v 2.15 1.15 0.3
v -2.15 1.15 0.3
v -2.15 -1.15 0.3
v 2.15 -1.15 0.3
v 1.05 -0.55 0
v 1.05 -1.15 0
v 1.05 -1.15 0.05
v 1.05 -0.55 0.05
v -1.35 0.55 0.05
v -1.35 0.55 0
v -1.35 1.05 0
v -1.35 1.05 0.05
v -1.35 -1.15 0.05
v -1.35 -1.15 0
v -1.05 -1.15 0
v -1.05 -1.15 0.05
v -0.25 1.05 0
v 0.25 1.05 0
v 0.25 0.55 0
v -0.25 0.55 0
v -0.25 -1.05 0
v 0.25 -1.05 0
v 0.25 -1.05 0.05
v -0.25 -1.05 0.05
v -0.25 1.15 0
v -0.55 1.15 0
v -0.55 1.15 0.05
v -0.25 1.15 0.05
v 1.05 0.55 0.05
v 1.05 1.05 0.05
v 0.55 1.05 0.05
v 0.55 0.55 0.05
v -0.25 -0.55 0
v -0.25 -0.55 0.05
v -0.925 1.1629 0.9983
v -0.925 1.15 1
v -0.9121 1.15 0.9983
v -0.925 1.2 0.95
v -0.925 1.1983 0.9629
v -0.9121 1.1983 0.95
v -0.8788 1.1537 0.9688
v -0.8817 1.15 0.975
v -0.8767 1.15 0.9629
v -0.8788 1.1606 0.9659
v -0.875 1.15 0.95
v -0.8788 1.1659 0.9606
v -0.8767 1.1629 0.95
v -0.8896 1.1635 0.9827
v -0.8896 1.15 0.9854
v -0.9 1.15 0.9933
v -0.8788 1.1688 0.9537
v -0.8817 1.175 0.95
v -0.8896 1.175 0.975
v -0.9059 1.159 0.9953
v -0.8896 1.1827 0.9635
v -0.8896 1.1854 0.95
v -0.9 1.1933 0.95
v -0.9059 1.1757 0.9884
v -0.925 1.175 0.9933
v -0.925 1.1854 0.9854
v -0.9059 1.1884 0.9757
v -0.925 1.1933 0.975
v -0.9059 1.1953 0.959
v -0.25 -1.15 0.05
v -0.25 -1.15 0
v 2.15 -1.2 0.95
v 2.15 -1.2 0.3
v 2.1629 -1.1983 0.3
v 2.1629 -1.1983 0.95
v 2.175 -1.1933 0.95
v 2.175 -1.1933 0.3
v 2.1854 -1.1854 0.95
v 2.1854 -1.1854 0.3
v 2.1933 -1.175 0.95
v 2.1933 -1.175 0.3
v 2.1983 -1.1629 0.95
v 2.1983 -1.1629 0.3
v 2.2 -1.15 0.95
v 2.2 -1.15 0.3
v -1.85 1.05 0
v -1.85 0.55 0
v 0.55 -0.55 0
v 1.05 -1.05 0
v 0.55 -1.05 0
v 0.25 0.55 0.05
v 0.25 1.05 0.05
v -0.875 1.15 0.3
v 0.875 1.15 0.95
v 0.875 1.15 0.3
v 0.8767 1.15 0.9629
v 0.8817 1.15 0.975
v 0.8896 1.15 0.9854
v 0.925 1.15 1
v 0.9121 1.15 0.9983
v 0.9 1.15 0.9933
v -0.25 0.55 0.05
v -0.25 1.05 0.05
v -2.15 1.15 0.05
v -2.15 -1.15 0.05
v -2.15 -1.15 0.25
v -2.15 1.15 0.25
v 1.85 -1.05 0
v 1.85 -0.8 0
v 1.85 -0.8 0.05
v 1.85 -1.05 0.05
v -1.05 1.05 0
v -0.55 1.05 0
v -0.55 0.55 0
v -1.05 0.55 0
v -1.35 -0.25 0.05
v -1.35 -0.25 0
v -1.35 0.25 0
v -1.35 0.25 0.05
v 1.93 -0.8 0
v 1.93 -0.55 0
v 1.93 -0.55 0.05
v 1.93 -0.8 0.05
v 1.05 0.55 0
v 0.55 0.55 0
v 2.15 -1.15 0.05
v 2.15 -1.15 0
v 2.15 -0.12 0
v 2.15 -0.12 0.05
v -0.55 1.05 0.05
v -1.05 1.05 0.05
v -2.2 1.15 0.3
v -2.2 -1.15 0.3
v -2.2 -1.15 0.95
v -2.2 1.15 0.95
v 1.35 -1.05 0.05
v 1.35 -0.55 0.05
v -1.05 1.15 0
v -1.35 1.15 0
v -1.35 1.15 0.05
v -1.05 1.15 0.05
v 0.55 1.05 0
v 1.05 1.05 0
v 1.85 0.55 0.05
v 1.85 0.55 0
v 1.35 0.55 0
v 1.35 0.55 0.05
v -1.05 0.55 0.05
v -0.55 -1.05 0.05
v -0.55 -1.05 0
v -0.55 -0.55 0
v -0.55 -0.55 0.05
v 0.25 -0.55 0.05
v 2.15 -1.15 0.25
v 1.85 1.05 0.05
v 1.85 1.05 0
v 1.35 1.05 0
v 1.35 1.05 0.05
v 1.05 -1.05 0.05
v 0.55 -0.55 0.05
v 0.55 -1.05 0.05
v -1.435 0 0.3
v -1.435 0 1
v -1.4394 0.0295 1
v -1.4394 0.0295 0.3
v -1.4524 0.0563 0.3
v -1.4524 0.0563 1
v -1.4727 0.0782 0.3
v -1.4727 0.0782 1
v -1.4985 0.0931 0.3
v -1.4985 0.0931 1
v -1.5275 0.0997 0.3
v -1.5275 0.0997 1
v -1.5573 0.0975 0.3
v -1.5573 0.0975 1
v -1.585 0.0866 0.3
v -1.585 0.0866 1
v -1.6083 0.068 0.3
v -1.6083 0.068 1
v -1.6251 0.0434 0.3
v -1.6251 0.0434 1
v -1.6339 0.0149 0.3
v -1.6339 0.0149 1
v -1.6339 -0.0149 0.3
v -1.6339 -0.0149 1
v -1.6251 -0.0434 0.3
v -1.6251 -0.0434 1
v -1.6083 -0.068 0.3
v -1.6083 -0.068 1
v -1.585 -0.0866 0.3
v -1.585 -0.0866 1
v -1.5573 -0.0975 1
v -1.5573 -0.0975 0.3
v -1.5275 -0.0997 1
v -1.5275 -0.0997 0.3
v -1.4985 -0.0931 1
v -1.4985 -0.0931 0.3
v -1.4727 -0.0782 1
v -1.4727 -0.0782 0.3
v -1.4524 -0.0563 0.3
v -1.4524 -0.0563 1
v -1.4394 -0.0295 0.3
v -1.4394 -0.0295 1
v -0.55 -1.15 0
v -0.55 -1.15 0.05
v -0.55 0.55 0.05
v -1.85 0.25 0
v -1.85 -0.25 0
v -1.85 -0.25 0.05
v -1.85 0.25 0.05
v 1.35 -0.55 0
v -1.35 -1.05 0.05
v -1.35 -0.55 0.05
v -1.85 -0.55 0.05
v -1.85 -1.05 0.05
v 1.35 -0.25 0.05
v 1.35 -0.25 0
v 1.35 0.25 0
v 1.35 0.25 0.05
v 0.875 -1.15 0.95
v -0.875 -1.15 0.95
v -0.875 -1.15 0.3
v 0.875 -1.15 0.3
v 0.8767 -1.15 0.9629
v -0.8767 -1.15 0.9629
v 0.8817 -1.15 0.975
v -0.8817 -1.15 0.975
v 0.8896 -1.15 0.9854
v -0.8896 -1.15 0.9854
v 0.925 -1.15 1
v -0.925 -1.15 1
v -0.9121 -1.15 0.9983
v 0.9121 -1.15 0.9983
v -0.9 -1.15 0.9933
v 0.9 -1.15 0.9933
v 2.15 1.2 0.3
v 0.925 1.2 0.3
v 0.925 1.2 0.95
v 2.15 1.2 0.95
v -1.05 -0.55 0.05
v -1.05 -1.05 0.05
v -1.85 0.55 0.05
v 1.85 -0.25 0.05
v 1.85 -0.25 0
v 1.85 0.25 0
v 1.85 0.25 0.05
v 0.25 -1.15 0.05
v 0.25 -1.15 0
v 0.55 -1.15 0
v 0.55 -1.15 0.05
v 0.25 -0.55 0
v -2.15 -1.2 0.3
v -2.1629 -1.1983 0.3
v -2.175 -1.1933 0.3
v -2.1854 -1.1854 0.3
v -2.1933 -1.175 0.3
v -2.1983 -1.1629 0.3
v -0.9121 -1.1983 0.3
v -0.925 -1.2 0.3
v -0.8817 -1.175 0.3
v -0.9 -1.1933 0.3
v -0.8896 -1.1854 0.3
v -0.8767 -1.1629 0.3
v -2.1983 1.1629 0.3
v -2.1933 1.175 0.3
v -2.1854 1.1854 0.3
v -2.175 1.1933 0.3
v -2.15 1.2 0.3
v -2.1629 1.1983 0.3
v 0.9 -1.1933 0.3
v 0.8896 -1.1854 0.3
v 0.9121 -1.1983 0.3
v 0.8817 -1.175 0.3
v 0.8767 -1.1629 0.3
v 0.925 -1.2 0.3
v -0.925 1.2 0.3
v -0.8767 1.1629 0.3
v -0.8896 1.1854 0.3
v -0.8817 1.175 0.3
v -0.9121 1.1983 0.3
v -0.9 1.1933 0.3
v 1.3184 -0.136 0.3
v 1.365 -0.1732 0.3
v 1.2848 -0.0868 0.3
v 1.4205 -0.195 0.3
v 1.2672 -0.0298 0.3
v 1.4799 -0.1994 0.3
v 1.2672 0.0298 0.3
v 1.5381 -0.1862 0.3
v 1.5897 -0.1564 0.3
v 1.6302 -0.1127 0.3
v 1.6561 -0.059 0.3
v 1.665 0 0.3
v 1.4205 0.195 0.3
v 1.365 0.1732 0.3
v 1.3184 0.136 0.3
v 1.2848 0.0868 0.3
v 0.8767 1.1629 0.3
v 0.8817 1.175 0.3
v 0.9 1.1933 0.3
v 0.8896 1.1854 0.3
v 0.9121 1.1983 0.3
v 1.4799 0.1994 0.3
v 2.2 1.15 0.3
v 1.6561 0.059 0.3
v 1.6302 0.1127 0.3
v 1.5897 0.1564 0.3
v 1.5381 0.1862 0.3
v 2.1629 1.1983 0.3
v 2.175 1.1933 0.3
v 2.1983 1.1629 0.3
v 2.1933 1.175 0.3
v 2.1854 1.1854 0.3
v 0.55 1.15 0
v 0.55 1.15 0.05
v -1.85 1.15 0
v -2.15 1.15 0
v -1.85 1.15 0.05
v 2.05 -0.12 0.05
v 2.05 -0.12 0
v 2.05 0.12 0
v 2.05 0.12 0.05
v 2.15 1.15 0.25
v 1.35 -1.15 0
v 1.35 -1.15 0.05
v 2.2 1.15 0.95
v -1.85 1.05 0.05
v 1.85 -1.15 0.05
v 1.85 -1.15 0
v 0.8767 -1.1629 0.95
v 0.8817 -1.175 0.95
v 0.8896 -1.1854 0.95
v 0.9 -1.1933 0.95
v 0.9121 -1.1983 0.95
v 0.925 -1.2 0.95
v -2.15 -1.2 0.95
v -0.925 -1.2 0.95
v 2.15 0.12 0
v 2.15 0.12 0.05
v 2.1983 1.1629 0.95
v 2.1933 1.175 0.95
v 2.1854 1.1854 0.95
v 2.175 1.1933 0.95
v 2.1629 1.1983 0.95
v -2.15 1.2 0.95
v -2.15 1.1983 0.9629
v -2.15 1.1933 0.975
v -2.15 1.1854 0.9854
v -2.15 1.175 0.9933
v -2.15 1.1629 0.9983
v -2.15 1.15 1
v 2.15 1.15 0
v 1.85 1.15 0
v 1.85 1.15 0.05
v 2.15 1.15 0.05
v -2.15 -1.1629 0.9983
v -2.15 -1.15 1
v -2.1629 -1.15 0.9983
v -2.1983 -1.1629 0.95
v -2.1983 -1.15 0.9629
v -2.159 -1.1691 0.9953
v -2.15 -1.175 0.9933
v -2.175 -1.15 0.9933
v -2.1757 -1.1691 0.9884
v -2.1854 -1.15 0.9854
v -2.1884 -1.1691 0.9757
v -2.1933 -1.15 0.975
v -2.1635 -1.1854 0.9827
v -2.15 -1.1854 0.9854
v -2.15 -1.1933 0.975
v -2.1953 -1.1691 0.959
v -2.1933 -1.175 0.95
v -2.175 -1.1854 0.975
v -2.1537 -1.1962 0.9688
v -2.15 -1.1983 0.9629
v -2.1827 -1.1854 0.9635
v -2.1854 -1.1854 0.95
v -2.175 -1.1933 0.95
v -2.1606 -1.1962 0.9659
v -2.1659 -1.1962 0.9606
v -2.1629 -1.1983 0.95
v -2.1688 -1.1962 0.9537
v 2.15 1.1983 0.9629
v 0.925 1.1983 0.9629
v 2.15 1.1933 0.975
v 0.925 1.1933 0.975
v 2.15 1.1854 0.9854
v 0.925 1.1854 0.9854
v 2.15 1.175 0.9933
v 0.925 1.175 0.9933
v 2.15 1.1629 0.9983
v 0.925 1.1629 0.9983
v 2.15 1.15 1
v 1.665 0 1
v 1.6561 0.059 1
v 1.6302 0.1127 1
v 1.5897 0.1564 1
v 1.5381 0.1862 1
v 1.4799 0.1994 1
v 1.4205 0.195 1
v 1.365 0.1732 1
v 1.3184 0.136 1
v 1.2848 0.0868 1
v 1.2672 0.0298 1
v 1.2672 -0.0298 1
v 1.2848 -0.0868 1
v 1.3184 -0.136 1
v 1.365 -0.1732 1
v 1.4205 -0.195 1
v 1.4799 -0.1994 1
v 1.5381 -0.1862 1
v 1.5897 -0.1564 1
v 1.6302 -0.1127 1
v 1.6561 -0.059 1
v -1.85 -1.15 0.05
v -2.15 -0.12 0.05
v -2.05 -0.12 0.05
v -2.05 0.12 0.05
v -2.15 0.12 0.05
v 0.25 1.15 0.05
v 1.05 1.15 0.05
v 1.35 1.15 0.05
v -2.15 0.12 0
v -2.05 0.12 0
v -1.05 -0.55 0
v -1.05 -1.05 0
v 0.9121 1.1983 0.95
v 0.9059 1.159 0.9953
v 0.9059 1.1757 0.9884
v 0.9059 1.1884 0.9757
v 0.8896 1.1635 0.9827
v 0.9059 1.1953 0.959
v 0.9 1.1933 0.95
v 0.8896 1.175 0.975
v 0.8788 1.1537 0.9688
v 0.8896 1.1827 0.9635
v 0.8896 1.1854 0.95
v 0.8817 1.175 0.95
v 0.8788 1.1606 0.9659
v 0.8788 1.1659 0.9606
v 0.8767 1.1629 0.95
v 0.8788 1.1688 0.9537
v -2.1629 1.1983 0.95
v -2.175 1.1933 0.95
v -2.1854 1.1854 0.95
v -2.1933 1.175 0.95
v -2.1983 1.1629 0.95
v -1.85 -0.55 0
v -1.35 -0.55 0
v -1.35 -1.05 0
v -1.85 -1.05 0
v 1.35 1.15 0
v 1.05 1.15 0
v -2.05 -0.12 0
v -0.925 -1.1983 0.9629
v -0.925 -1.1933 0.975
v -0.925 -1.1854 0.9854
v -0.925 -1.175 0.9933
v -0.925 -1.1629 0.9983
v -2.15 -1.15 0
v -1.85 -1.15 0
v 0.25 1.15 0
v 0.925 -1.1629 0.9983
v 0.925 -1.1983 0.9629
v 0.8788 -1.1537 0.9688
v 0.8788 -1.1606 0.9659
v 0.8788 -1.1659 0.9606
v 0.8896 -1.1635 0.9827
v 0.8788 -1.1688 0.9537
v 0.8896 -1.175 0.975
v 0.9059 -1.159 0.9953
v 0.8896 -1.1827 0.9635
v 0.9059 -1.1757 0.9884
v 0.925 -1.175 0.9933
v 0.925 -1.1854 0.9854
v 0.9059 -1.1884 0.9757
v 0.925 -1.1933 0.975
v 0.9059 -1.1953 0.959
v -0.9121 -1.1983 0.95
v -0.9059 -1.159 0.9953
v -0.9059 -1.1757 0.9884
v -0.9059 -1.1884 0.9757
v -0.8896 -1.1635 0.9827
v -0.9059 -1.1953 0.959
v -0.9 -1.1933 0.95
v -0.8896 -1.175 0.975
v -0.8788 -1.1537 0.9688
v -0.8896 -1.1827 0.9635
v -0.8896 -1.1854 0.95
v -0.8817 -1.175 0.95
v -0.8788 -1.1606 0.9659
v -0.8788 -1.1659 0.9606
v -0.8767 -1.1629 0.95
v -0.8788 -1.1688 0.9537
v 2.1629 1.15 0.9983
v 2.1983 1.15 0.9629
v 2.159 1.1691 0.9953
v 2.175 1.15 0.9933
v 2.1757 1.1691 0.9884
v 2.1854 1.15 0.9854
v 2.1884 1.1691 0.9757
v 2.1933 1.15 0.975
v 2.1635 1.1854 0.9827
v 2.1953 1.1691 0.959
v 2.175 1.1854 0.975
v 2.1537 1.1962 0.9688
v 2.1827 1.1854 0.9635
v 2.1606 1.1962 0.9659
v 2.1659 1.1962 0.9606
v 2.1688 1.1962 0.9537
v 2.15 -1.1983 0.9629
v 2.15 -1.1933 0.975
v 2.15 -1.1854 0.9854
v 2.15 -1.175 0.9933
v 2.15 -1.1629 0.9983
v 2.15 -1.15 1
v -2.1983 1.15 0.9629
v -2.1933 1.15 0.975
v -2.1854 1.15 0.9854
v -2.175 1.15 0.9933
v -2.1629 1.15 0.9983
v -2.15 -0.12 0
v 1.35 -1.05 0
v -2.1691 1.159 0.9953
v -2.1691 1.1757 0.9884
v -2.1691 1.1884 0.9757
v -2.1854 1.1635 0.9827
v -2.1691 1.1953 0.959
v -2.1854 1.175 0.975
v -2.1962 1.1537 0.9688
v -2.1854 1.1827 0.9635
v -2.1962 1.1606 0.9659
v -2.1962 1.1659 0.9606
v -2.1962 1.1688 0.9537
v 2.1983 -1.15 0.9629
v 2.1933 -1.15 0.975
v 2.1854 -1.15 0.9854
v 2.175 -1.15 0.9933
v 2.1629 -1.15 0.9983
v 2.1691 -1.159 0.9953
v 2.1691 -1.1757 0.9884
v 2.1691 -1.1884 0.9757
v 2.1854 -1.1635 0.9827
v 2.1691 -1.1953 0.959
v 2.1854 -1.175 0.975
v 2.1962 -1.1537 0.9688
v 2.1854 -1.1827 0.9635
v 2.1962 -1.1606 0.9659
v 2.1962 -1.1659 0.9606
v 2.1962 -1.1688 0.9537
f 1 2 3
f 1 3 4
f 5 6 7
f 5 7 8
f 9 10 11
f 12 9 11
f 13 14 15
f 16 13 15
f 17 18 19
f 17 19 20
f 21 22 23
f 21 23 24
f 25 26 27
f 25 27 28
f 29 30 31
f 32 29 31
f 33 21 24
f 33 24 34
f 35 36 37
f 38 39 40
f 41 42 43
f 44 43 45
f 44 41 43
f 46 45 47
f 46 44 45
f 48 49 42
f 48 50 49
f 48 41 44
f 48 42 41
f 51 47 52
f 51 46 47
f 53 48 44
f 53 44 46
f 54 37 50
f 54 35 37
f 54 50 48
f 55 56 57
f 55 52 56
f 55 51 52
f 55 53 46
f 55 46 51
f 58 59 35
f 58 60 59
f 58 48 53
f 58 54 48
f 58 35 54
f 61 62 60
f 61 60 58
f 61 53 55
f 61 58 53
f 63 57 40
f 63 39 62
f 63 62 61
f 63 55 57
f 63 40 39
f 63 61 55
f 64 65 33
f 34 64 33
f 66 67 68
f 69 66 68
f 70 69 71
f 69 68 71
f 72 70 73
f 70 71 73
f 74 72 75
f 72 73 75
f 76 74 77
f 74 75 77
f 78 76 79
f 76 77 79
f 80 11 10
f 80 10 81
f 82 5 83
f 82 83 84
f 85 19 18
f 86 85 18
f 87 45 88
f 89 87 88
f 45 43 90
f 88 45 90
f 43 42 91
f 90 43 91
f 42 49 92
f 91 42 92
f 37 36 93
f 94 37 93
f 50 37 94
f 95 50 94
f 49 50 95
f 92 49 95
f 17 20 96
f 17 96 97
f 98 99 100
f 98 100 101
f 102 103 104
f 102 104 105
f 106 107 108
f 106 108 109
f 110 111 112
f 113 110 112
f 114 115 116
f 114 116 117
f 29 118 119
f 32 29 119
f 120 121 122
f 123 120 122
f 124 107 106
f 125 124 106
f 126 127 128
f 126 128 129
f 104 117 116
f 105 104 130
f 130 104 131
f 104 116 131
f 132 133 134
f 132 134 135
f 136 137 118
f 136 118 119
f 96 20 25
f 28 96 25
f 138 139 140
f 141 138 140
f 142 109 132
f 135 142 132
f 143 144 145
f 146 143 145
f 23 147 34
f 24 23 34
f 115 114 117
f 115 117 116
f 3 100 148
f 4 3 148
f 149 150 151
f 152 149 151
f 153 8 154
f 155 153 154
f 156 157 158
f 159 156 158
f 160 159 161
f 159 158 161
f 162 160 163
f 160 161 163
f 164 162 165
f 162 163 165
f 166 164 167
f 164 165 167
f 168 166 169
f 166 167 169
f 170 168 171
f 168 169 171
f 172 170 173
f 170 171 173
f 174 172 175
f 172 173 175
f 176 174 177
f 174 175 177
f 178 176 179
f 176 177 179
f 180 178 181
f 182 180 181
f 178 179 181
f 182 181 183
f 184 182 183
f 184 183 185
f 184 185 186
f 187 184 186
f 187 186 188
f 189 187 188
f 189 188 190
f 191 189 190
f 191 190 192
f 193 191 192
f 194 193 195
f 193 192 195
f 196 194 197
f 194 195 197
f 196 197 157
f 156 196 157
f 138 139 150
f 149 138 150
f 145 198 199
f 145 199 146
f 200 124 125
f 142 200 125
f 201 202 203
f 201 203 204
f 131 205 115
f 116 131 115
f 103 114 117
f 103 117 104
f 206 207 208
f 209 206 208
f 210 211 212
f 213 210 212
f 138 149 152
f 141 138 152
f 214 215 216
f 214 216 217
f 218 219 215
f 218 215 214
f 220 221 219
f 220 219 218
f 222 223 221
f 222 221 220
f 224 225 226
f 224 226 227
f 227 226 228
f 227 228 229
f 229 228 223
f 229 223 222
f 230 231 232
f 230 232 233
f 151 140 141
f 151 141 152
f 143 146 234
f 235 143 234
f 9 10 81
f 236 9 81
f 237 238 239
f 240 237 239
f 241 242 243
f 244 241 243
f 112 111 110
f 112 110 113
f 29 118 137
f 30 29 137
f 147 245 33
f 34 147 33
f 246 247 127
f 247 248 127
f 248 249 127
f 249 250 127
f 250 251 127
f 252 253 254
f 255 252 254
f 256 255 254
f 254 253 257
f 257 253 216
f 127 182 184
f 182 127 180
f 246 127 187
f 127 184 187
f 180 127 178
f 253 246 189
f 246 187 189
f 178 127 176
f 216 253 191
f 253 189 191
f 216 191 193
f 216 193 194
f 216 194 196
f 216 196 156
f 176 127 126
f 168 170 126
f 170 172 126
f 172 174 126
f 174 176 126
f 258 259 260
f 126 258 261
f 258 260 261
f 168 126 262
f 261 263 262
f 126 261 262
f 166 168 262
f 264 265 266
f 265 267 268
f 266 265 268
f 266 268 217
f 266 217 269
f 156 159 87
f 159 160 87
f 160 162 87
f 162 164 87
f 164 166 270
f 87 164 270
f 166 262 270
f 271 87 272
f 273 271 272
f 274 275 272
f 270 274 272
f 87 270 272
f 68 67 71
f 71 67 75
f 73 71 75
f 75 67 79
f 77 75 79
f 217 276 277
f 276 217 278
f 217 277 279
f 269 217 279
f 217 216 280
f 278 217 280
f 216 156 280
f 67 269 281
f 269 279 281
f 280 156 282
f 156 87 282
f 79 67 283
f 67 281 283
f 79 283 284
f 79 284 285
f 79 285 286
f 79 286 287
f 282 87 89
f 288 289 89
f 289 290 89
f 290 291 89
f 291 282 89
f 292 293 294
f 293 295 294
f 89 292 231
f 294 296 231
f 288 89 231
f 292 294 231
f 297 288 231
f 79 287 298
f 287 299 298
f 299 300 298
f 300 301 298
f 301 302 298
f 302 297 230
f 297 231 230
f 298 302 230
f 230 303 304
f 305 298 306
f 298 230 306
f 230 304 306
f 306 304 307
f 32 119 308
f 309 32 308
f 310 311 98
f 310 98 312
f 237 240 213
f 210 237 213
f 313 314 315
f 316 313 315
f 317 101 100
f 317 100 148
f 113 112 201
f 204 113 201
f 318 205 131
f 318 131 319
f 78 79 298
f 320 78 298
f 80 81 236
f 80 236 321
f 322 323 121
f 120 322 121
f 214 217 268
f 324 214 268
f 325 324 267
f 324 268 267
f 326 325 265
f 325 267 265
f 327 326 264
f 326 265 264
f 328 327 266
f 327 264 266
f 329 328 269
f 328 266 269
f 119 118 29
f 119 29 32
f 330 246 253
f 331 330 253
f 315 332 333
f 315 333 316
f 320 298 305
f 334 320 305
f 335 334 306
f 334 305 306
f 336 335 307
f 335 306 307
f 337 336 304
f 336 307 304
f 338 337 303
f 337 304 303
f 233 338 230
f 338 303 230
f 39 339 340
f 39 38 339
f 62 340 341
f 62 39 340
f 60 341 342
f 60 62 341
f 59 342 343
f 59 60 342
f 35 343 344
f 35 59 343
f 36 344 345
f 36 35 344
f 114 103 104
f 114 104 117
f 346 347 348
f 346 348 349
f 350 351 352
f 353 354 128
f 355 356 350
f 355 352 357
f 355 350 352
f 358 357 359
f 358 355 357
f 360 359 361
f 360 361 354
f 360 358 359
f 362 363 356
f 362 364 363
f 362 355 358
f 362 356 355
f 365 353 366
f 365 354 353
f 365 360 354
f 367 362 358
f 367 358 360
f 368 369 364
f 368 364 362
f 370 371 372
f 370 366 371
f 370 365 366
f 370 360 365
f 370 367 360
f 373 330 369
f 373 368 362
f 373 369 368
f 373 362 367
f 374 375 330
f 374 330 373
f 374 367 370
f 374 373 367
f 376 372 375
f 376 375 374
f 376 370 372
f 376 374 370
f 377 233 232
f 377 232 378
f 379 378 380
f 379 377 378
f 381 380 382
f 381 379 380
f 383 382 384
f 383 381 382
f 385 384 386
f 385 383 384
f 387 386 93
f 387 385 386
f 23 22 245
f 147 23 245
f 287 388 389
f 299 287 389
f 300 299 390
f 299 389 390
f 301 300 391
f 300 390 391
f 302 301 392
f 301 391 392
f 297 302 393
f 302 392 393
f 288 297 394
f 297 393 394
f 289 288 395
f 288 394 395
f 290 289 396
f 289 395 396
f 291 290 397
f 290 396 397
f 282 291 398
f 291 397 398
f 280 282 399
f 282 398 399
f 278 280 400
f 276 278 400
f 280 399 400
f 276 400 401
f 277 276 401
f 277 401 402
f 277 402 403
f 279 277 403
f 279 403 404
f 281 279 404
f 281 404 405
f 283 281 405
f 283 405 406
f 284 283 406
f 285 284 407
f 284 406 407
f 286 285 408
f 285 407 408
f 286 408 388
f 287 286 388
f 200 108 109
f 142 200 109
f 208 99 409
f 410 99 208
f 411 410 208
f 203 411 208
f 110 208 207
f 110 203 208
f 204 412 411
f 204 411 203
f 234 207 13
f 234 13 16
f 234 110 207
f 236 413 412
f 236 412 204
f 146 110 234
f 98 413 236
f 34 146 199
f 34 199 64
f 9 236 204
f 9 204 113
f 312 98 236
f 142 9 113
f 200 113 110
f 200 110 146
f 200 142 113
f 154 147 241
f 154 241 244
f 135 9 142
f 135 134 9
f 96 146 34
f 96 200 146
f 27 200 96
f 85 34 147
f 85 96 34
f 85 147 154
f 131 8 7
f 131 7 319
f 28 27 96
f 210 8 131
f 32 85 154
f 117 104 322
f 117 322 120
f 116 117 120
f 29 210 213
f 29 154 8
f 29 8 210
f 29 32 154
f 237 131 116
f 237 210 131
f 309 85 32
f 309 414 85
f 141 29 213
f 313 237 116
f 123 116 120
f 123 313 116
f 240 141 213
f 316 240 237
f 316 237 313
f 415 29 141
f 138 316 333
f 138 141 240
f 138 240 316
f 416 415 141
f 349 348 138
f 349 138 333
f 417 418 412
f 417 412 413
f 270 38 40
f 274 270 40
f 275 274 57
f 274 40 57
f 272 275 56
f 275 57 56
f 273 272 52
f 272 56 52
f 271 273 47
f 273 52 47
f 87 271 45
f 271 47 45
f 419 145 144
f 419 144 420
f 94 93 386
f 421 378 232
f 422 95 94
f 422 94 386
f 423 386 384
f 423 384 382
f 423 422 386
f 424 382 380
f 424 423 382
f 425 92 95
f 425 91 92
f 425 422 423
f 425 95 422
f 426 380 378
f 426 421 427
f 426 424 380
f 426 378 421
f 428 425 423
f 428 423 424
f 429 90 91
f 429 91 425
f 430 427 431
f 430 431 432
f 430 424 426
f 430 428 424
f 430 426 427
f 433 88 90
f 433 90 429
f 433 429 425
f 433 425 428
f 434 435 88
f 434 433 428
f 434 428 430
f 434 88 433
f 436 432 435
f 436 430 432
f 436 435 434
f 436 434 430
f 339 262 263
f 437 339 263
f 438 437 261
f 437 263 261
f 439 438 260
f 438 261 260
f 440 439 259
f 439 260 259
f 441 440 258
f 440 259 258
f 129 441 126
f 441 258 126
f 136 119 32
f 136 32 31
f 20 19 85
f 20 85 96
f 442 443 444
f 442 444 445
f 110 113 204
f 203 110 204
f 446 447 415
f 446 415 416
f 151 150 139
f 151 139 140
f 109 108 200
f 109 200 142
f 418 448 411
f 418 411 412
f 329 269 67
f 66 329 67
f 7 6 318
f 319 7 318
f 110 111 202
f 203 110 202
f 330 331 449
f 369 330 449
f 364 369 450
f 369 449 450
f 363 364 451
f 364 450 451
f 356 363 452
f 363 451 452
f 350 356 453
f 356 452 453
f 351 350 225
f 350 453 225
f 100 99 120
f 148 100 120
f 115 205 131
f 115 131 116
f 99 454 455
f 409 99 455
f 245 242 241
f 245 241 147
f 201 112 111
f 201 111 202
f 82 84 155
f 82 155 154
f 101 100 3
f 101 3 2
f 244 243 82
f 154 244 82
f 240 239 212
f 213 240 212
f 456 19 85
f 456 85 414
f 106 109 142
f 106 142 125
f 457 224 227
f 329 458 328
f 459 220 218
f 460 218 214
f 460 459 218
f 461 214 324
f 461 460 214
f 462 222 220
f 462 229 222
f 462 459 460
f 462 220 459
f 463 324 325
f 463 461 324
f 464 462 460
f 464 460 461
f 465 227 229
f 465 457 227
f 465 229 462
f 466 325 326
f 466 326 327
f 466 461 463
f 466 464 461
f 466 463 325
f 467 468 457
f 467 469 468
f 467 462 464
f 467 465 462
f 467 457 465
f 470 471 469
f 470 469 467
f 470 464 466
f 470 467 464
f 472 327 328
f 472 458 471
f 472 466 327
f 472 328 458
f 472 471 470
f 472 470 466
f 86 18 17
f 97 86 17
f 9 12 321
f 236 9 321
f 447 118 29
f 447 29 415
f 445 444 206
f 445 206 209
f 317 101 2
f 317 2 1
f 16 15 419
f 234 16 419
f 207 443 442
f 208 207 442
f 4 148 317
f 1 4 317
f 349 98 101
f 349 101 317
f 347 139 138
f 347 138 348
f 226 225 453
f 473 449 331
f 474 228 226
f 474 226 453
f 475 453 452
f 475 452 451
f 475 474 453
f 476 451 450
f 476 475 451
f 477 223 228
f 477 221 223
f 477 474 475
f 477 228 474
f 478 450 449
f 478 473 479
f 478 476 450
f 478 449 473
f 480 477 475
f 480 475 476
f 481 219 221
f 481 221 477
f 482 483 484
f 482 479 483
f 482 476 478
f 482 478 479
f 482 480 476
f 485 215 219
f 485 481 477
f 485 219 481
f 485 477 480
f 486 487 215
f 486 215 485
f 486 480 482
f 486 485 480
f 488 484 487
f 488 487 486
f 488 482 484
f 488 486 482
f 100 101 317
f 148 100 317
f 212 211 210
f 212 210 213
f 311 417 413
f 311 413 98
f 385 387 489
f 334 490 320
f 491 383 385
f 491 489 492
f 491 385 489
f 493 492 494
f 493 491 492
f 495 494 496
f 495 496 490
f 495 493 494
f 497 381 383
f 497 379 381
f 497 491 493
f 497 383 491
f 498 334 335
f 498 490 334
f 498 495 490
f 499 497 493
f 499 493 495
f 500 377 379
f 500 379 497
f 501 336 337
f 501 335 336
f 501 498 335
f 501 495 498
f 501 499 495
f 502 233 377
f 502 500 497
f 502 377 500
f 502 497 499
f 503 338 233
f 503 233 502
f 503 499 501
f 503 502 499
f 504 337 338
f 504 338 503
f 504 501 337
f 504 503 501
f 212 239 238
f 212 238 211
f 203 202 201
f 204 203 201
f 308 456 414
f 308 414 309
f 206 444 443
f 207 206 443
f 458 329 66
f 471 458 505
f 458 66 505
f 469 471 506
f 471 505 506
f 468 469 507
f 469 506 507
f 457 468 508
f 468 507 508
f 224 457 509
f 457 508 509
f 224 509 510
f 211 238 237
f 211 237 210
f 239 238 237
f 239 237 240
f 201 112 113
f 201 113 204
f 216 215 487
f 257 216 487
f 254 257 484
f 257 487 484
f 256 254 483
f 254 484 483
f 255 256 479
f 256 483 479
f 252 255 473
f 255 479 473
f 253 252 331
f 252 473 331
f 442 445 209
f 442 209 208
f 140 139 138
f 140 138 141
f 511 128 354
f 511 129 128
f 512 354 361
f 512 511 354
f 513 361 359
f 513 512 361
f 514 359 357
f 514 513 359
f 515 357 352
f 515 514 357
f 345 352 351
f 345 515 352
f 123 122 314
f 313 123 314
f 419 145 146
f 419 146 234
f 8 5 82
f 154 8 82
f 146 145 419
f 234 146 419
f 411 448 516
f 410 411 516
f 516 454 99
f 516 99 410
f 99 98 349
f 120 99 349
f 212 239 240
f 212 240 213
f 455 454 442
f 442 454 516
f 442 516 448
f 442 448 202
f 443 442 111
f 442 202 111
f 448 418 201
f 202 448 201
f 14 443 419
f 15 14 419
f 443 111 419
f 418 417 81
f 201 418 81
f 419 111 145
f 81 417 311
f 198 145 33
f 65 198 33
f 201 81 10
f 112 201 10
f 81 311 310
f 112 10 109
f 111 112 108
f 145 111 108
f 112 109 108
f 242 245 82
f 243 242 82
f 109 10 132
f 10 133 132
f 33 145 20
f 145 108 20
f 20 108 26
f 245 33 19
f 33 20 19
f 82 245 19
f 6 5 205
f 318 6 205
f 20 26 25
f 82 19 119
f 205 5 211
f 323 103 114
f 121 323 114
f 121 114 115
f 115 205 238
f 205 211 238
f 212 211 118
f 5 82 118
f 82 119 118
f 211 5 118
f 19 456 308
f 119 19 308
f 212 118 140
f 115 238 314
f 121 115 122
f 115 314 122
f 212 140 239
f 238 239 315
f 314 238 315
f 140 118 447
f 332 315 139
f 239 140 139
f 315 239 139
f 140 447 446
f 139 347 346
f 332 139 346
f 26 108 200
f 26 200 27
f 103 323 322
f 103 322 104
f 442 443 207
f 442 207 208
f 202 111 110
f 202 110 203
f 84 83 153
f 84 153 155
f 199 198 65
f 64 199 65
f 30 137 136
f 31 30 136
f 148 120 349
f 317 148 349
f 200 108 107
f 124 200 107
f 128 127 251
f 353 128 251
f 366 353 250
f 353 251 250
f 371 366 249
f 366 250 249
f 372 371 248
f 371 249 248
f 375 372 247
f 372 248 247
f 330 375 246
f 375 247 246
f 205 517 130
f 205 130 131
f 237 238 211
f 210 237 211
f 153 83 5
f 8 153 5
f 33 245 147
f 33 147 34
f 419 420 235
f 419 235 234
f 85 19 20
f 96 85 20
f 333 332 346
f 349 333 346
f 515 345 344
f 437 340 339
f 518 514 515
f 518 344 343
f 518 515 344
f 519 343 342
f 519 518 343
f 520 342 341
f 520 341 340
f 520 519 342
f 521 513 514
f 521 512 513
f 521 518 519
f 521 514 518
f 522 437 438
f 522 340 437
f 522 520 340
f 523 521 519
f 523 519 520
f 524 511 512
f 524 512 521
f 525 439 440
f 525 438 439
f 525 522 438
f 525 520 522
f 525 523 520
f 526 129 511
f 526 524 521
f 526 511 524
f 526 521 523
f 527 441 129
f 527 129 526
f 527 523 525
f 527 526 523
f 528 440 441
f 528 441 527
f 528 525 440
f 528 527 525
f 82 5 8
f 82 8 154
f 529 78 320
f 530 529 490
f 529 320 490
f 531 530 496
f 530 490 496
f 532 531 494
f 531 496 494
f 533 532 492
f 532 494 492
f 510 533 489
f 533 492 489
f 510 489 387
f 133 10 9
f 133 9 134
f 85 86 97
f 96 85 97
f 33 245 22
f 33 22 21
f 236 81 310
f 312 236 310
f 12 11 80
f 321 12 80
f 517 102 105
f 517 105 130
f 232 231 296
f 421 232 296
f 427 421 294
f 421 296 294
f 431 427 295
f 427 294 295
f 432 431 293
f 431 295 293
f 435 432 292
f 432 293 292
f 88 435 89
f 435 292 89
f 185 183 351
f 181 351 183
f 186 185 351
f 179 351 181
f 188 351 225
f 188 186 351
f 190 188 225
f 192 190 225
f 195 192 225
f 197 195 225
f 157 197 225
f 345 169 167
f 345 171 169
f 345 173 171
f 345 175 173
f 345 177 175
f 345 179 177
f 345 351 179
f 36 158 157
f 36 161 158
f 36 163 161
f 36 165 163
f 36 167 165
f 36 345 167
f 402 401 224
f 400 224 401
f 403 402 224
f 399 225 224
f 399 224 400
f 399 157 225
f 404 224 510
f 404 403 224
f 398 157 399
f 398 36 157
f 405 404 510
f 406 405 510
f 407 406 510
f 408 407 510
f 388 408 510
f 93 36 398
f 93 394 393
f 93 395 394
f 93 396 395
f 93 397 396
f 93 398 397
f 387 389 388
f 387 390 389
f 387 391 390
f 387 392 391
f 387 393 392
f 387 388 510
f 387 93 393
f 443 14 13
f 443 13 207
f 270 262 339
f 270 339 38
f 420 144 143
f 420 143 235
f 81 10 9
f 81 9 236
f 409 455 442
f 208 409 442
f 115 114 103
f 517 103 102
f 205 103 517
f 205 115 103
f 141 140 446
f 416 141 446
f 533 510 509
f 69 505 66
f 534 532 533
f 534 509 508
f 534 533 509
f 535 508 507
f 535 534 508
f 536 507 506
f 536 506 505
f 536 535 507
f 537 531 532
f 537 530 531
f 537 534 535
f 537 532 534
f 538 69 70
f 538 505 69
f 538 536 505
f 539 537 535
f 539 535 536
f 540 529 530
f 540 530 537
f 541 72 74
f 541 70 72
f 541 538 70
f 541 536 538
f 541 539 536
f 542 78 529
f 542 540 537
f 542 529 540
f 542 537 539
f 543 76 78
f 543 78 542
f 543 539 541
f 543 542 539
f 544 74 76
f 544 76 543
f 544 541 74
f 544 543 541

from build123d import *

# Parameters (mm, degrees)
SKETCH1_W              = 4.3
SKETCH1_H              = 2.3
BOSS_EXTRUDE1_DEPTH    = 0.05
SKETCH2_W              = 4.3
SKETCH2_H              = 2.3
BOSS_EXTRUDE2_DEPTH    = 0.2
SKETCH3_W              = 4.3
SKETCH3_H              = 2.3
BOSS_EXTRUDE3_DEPTH    = 0.05
SKETCH4_W              = 4.4
SKETCH4_H              = 2.4
BOSS_EXTRUDE4_DEPTH    = 0.7
FILLET3_R              = 0.05
SKETCH6_W              = 1.75
SKETCH6_H              = 0.1
CUT_EXTRUDE1_DEPTH     = 0.7
FILLET1_R              = 0.05
SKETCH7_R              = 0.1
SKETCH7_R_2            = 0.2
CUT_EXTRUDE2_DEPTH     = 0.7
SKETCH9_W              = 0.5
SKETCH9_H              = 0.6
SKETCH9_H_2            = 0.5
SKETCH9_W_2            = 0.1
SKETCH9_H_3            = 0.24
CUT_EXTRUDE3_DEPTH     = 3.698147513
SKETCH8_W              = 0.5
SKETCH8_H              = 0.5
BOSS_EXTRUDE5_DEPTH    = 0.05
BOSS_EXTRUDE5_2_DEPTH  = 0.05
BOSS_EXTRUDE5_3_DEPTH  = 0.05
BOSS_EXTRUDE5_4_DEPTH  = 0.05
BOSS_EXTRUDE5_5_DEPTH  = 0.05
BOSS_EXTRUDE5_6_DEPTH  = 0.05
BOSS_EXTRUDE5_7_DEPTH  = 0.05
BOSS_EXTRUDE5_8_DEPTH  = 0.05
BOSS_EXTRUDE5_9_DEPTH  = 0.05
BOSS_EXTRUDE5_10_DEPTH = 0.05
BOSS_EXTRUDE5_11_DEPTH = 0.05
BOSS_EXTRUDE5_12_DEPTH = 0.05


with BuildPart() as part:
    # Sketch1 → Boss-Extrude1 (new body)
    with BuildSketch(Plane.XY):
        Rectangle(SKETCH1_W, SKETCH1_H)
    extrude(amount=BOSS_EXTRUDE1_DEPTH)

    # Sketch9 → Cut-Extrude3 (cut, through all)
    with BuildSketch(Plane(origin=(0, 0, 0), x_dir=(-1, 0, 0), z_dir=(0, 0, -1))):
        with Locations((-1.6, 0.85)):
            Rectangle(SKETCH9_W, SKETCH9_H)
        with Locations((-0.8, 0.85)):
            Rectangle(SKETCH9_W, SKETCH9_H)
        with Locations((0, 0.85)):
            Rectangle(SKETCH9_W, SKETCH9_H)
        with Locations((0.8, 0.85)):
            Rectangle(SKETCH9_W, SKETCH9_H)
        with Locations((1.6, 0.85)):
            Rectangle(SKETCH9_W, SKETCH9_H)
        Polygon((-1.85, -0.55), (-1.35, -0.55), (-1.35, -1.15), (-1.85, -1.15), (-1.85, -0.8), (-1.93, -0.8), (-1.93, -0.55), align=None)
        with Locations((-0.8, -0.85)):
            Rectangle(SKETCH9_W, SKETCH9_H)
        with Locations((0, -0.85)):
            Rectangle(SKETCH9_W, SKETCH9_H)
        with Locations((0.8, -0.85)):
            Rectangle(SKETCH9_W, SKETCH9_H)
        with Locations((1.6, -0.85)):
            Rectangle(SKETCH9_W, SKETCH9_H)
        with Locations((-1.6, 0)):
            Rectangle(SKETCH9_W, SKETCH9_H_2)
        with Locations((1.6, 0)):
            Rectangle(SKETCH9_W, SKETCH9_H_2)
        with Locations((-2.1, 0)):
            Rectangle(SKETCH9_W_2, SKETCH9_H_3)
        with Locations((2.1, 0)):
            Rectangle(SKETCH9_W_2, SKETCH9_H_3)
    extrude(amount=-CUT_EXTRUDE3_DEPTH, mode=Mode.SUBTRACT)


with BuildPart() as body_2:
    # Sketch2 → Boss-Extrude2 (new body)
    with BuildSketch(Plane.XY.offset(0.05)):
        Rectangle(SKETCH2_W, SKETCH2_H)
    extrude(amount=BOSS_EXTRUDE2_DEPTH)


with BuildPart() as body_3:
    # Sketch3 → Boss-Extrude3 (new body)
    with BuildSketch(Plane.XY.offset(0.25)):
        Rectangle(SKETCH3_W, SKETCH3_H)
    extrude(amount=BOSS_EXTRUDE3_DEPTH)


with BuildPart() as body_4:
    # Sketch4 → Boss-Extrude4 (new body)
    with BuildSketch(Plane.XY.offset(0.3)):
        Rectangle(SKETCH4_W, SKETCH4_H)
    extrude(amount=BOSS_EXTRUDE4_DEPTH)

    # Fillet3
    fillet3_edges = [body_4.edges().sort_by_distance(p)[0] for p in [
        (-2.2, 0, 1),
        (0, -1.2, 1),
        (2.2, 0, 1),
        (0, 1.2, 1),
    ]]
    fillet(fillet3_edges, radius=FILLET3_R)

    # Sketch6 → Cut-Extrude1 (cut)
    with BuildSketch(Plane.XY.offset(1)):
        with Locations((0, 1.2)):
            Rectangle(SKETCH6_W, SKETCH6_H)
        with Locations((0, -1.2)):
            Rectangle(SKETCH6_W, SKETCH6_H)
    extrude(amount=-CUT_EXTRUDE1_DEPTH, mode=Mode.SUBTRACT)

    # Fillet1
    # the kernel refuses this fillet: 0.05 mm, written as the material it takes off along each edge
    with BuildSketch(Plane(origin=(2.15, 1.15, 0.95), x_dir=(1, 0, 0), z_dir=(0, 1, 0))) as fillet1_piece_1_section:
        Polygon((0, 0), (FILLET1_R, 0), (FILLET1_R, -FILLET1_R), (0, -FILLET1_R), align=None)
    fillet1_piece_1 = extrude(amount=FILLET1_R, mode=Mode.PRIVATE)
    fillet1_piece_1 = fillet1_piece_1 - Plane(origin=(2.15, 1.15, 0.95), x_dir=(-0.7071067811865475, 0, -0.7071067811865475), z_dir=(0, 1, 0)) * Sphere(FILLET1_R, mode=Mode.PRIVATE)
    add(fillet1_piece_1, mode=Mode.SUBTRACT)
    with BuildSketch(Plane(origin=(2.15, -1.15, 0.95), x_dir=(0, -1, 0), z_dir=(1, 0, 0))) as fillet1_piece_2_section:
        Polygon((0, 0), (FILLET1_R, 0), (FILLET1_R, -FILLET1_R), (0, -FILLET1_R), align=None)
    fillet1_piece_2 = extrude(amount=FILLET1_R, mode=Mode.PRIVATE)
    fillet1_piece_2 = fillet1_piece_2 - Plane(origin=(2.15, -1.15, 0.95), x_dir=(0, 0.7071067811865475, -0.7071067811865475), z_dir=(1, 0, 0)) * Sphere(FILLET1_R, mode=Mode.PRIVATE)
    add(fillet1_piece_2, mode=Mode.SUBTRACT)
    with BuildSketch(Plane(origin=(-2.15, 1.15, 0.95), x_dir=(0, 1, 0), z_dir=(-1, 0, 0))) as fillet1_piece_3_section:
        Polygon((0, 0), (FILLET1_R, 0), (FILLET1_R, -FILLET1_R), (0, -FILLET1_R), align=None)
    fillet1_piece_3 = extrude(amount=FILLET1_R, mode=Mode.PRIVATE)
    fillet1_piece_3 = fillet1_piece_3 - Plane(origin=(-2.15, 1.15, 0.95), x_dir=(0, -0.7071067811865475, -0.7071067811865475), z_dir=(-1, 0, 0)) * Sphere(FILLET1_R, mode=Mode.PRIVATE)
    add(fillet1_piece_3, mode=Mode.SUBTRACT)
    with BuildSketch(Plane(origin=(-2.15, -1.15, 0.95), x_dir=(-1, 0, 0), z_dir=(0, -1, 0))) as fillet1_piece_4_section:
        Polygon((0, 0), (FILLET1_R, 0), (FILLET1_R, -FILLET1_R), (0, -FILLET1_R), align=None)
    fillet1_piece_4 = extrude(amount=FILLET1_R, mode=Mode.PRIVATE)
    fillet1_piece_4 = fillet1_piece_4 - Plane(origin=(-2.15, -1.15, 0.95), x_dir=(0.7071067811865475, 0, -0.7071067811865475), z_dir=(0, -1, 0)) * Sphere(FILLET1_R, mode=Mode.PRIVATE)
    add(fillet1_piece_4, mode=Mode.SUBTRACT)
    with BuildSketch(Plane(origin=(2.2, 1.2, 0.175), x_dir=(-1, 0, 0), z_dir=(0, 0, 1)), Plane(origin=(2.2, -1.2, 0.175), x_dir=(0, 1, 0), z_dir=(0, 0, 1)), Plane(origin=(0.875, -1.2, 0.175), x_dir=(1, 0, 0), z_dir=(0, 0, 1)), Plane(origin=(-0.875, -1.2, 0.95), x_dir=(-1, 0, 0), z_dir=(0, 0, -1)), Plane(origin=(-2.2, 1.2, 0.175), x_dir=(0, -1, 0), z_dir=(0, 0, 1)), Plane(origin=(0.875, 1.2, 0.175), x_dir=(0, -1, 0), z_dir=(0, 0, 1)), Plane(origin=(-2.2, -1.2, 0.175), x_dir=(1, 0, 0), z_dir=(0, 0, 1))) as fillet1_piece_5:
        with BuildLine():
            CenterArc((FILLET1_R, FILLET1_R), FILLET1_R, 180, 90)
            Line((0, FILLET1_R), (0, 0))
            Line((0, 0), (FILLET1_R, 0))
        make_face()
    extrude(amount=0.775, mode=Mode.SUBTRACT)
    with BuildSketch(Plane(origin=(-0.875, 1.2, 0.95), x_dir=(-1, 0, 0), z_dir=(0, 0, -1))) as fillet1_piece_6:
        with BuildLine():
            CenterArc((FILLET1_R, -FILLET1_R), FILLET1_R, 90, 90)
            Line((0, -FILLET1_R), (0, 0))
            Line((0, 0), (FILLET1_R, 0))
        make_face()
    extrude(amount=0.775, mode=Mode.SUBTRACT)
    with BuildSketch(Plane(origin=(0.875, -1.15, 0.95), x_dir=(0, 0, 1), z_dir=(0, 1, 0))) as fillet1_piece_7:
        with BuildLine():
            CenterArc((0.05 - FILLET1_R, FILLET1_R), FILLET1_R, 270, 90)
            Line((0.05, FILLET1_R), (0.05, 0))
            Line((0.05, 0), (0.05 - FILLET1_R, 0))
        make_face()
    revolve(axis=Axis((0.875, -1.15, 0.95), (1, 0, 0)), revolution_arc=90, mode=Mode.SUBTRACT)
    with BuildSketch(Plane(origin=(-0.875, -1.15, 0.95), x_dir=(0, 0, 1), z_dir=(0, 1, 0))) as fillet1_piece_8:
        with BuildLine():
            CenterArc((0.05 - FILLET1_R, -FILLET1_R), FILLET1_R, 360, 90)
            Line((0.05, -FILLET1_R), (0.05, 0))
            Line((0.05, 0), (0.05 - FILLET1_R, 0))
        make_face()
    revolve(axis=Axis((-0.875, -1.15, 0.95), (1, 0, 0)), revolution_arc=90, mode=Mode.SUBTRACT)
    with BuildSketch(Plane(origin=(-0.875, 1.15, 0.95), x_dir=(0, 0, 1), z_dir=(0, -1, 0))) as fillet1_piece_9:
        with BuildLine():
            CenterArc((0.05 - FILLET1_R, FILLET1_R), FILLET1_R, 270, 90)
            Line((0.05, FILLET1_R), (0.05, 0))
            Line((0.05, 0), (0.05 - FILLET1_R, 0))
        make_face()
    revolve(axis=Axis((-0.875, 1.15, 0.95), (-1, 0, 0)), revolution_arc=90, mode=Mode.SUBTRACT)
    with BuildSketch(Plane(origin=(0.875, 1.15, 0.95), x_dir=(0, 0, 1), z_dir=(0, -1, 0))) as fillet1_piece_10:
        with BuildLine():
            CenterArc((0.05 - FILLET1_R, -FILLET1_R), FILLET1_R, 0, 90)
            Line((0.05, -FILLET1_R), (0.05, 0))
            Line((0.05, 0), (0.05 - FILLET1_R, 0))
        make_face()
    revolve(axis=Axis((0.875, 1.15, 0.95), (-1, 0, 0)), revolution_arc=90, mode=Mode.SUBTRACT)

    # Sketch7 → Cut-Extrude2 (cut)
    with BuildSketch(Plane.XY.offset(1)):
        with Locations((-1.535, 0)):
            Circle(SKETCH7_R)
        with Locations((1.465, 0)):
            Circle(SKETCH7_R_2)
    extrude(amount=-CUT_EXTRUDE2_DEPTH, mode=Mode.SUBTRACT)


with BuildPart() as body_5:
    # Sketch8 → Boss-Extrude5 (new body)
    with BuildSketch(Plane(origin=(0, 0, 0), x_dir=(-1, 0, 0), z_dir=(0, 0, -1))):
        with Locations((-0.8, -0.8)):
            Rectangle(SKETCH8_W, SKETCH8_H)
    extrude(amount=-BOSS_EXTRUDE5_DEPTH)


with BuildPart() as body_6:
    # Sketch8 → Boss-Extrude5 2 (new body)
    with BuildSketch(Plane(origin=(0, 0, 0), x_dir=(-1, 0, 0), z_dir=(0, 0, -1))):
        Polygon((-1.85, -1.05), (-1.35, -1.05), (-1.35, -0.55), (-1.85, -0.55), (-1.93, -0.55), (-1.93, -0.8), (-1.85, -0.8), align=None)
    extrude(amount=-BOSS_EXTRUDE5_2_DEPTH)


with BuildPart() as body_7:
    # Sketch8 → Boss-Extrude5 3 (new body)
    with BuildSketch(Plane(origin=(0, 0, 0), x_dir=(-1, 0, 0), z_dir=(0, 0, -1))):
        with Locations((0, -0.8)):
            Rectangle(SKETCH8_W, SKETCH8_H)
    extrude(amount=-BOSS_EXTRUDE5_3_DEPTH)


with BuildPart() as body_8:
    # Sketch8 → Boss-Extrude5 4 (new body)
    with BuildSketch(Plane(origin=(0, 0, 0), x_dir=(-1, 0, 0), z_dir=(0, 0, -1))):
        with Locations((0.8, -0.8)):
            Rectangle(SKETCH8_W, SKETCH8_H)
    extrude(amount=-BOSS_EXTRUDE5_4_DEPTH)


with BuildPart() as body_9:
    # Sketch8 → Boss-Extrude5 5 (new body)
    with BuildSketch(Plane(origin=(0, 0, 0), x_dir=(-1, 0, 0), z_dir=(0, 0, -1))):
        with Locations((1.6, -0.8)):
            Rectangle(SKETCH8_W, SKETCH8_H)
    extrude(amount=-BOSS_EXTRUDE5_5_DEPTH)


with BuildPart() as body_10:
    # Sketch8 → Boss-Extrude5 6 (new body)
    with BuildSketch(Plane(origin=(0, 0, 0), x_dir=(-1, 0, 0), z_dir=(0, 0, -1))):
        with Locations((1.6, 0)):
            Rectangle(SKETCH8_W, SKETCH8_H)
    extrude(amount=-BOSS_EXTRUDE5_6_DEPTH)


with BuildPart() as body_11:
    # Sketch8 → Boss-Extrude5 7 (new body)
    with BuildSketch(Plane(origin=(0, 0, 0), x_dir=(-1, 0, 0), z_dir=(0, 0, -1))):
        with Locations((-0.8, 0.8)):
            Rectangle(SKETCH8_W, SKETCH8_H)
    extrude(amount=-BOSS_EXTRUDE5_7_DEPTH)


with BuildPart() as body_12:
    # Sketch8 → Boss-Extrude5 8 (new body)
    with BuildSketch(Plane(origin=(0, 0, 0), x_dir=(-1, 0, 0), z_dir=(0, 0, -1))):
        with Locations((0, 0.8)):
            Rectangle(SKETCH8_W, SKETCH8_H)
    extrude(amount=-BOSS_EXTRUDE5_8_DEPTH)


with BuildPart() as body_13:
    # Sketch8 → Boss-Extrude5 9 (new body)
    with BuildSketch(Plane(origin=(0, 0, 0), x_dir=(-1, 0, 0), z_dir=(0, 0, -1))):
        with Locations((0.8, 0.8)):
            Rectangle(SKETCH8_W, SKETCH8_H)
    extrude(amount=-BOSS_EXTRUDE5_9_DEPTH)


with BuildPart() as body_14:
    # Sketch8 → Boss-Extrude5 10 (new body)
    with BuildSketch(Plane(origin=(0, 0, 0), x_dir=(-1, 0, 0), z_dir=(0, 0, -1))):
        with Locations((1.6, 0.8)):
            Rectangle(SKETCH8_W, SKETCH8_H)
    extrude(amount=-BOSS_EXTRUDE5_10_DEPTH)


with BuildPart() as body_15:
    # Sketch8 → Boss-Extrude5 11 (new body)
    with BuildSketch(Plane(origin=(0, 0, 0), x_dir=(-1, 0, 0), z_dir=(0, 0, -1))):
        with Locations((-1.6, 0)):
            Rectangle(SKETCH8_W, SKETCH8_H)
    extrude(amount=-BOSS_EXTRUDE5_11_DEPTH)


with BuildPart() as body_16:
    # Sketch8 → Boss-Extrude5 12 (new body)
    with BuildSketch(Plane(origin=(0, 0, 0), x_dir=(-1, 0, 0), z_dir=(0, 0, -1))):
        with Locations((-1.6, 0.8)):
            Rectangle(SKETCH8_W, SKETCH8_H)
    extrude(amount=-BOSS_EXTRUDE5_12_DEPTH)


solid = Compound([part.part, body_2.part, body_3.part, body_4.part, body_5.part, body_6.part, body_7.part, body_8.part, body_9.part, body_10.part, body_11.part, body_12.part, body_13.part, body_14.part, body_15.part, body_16.part])
